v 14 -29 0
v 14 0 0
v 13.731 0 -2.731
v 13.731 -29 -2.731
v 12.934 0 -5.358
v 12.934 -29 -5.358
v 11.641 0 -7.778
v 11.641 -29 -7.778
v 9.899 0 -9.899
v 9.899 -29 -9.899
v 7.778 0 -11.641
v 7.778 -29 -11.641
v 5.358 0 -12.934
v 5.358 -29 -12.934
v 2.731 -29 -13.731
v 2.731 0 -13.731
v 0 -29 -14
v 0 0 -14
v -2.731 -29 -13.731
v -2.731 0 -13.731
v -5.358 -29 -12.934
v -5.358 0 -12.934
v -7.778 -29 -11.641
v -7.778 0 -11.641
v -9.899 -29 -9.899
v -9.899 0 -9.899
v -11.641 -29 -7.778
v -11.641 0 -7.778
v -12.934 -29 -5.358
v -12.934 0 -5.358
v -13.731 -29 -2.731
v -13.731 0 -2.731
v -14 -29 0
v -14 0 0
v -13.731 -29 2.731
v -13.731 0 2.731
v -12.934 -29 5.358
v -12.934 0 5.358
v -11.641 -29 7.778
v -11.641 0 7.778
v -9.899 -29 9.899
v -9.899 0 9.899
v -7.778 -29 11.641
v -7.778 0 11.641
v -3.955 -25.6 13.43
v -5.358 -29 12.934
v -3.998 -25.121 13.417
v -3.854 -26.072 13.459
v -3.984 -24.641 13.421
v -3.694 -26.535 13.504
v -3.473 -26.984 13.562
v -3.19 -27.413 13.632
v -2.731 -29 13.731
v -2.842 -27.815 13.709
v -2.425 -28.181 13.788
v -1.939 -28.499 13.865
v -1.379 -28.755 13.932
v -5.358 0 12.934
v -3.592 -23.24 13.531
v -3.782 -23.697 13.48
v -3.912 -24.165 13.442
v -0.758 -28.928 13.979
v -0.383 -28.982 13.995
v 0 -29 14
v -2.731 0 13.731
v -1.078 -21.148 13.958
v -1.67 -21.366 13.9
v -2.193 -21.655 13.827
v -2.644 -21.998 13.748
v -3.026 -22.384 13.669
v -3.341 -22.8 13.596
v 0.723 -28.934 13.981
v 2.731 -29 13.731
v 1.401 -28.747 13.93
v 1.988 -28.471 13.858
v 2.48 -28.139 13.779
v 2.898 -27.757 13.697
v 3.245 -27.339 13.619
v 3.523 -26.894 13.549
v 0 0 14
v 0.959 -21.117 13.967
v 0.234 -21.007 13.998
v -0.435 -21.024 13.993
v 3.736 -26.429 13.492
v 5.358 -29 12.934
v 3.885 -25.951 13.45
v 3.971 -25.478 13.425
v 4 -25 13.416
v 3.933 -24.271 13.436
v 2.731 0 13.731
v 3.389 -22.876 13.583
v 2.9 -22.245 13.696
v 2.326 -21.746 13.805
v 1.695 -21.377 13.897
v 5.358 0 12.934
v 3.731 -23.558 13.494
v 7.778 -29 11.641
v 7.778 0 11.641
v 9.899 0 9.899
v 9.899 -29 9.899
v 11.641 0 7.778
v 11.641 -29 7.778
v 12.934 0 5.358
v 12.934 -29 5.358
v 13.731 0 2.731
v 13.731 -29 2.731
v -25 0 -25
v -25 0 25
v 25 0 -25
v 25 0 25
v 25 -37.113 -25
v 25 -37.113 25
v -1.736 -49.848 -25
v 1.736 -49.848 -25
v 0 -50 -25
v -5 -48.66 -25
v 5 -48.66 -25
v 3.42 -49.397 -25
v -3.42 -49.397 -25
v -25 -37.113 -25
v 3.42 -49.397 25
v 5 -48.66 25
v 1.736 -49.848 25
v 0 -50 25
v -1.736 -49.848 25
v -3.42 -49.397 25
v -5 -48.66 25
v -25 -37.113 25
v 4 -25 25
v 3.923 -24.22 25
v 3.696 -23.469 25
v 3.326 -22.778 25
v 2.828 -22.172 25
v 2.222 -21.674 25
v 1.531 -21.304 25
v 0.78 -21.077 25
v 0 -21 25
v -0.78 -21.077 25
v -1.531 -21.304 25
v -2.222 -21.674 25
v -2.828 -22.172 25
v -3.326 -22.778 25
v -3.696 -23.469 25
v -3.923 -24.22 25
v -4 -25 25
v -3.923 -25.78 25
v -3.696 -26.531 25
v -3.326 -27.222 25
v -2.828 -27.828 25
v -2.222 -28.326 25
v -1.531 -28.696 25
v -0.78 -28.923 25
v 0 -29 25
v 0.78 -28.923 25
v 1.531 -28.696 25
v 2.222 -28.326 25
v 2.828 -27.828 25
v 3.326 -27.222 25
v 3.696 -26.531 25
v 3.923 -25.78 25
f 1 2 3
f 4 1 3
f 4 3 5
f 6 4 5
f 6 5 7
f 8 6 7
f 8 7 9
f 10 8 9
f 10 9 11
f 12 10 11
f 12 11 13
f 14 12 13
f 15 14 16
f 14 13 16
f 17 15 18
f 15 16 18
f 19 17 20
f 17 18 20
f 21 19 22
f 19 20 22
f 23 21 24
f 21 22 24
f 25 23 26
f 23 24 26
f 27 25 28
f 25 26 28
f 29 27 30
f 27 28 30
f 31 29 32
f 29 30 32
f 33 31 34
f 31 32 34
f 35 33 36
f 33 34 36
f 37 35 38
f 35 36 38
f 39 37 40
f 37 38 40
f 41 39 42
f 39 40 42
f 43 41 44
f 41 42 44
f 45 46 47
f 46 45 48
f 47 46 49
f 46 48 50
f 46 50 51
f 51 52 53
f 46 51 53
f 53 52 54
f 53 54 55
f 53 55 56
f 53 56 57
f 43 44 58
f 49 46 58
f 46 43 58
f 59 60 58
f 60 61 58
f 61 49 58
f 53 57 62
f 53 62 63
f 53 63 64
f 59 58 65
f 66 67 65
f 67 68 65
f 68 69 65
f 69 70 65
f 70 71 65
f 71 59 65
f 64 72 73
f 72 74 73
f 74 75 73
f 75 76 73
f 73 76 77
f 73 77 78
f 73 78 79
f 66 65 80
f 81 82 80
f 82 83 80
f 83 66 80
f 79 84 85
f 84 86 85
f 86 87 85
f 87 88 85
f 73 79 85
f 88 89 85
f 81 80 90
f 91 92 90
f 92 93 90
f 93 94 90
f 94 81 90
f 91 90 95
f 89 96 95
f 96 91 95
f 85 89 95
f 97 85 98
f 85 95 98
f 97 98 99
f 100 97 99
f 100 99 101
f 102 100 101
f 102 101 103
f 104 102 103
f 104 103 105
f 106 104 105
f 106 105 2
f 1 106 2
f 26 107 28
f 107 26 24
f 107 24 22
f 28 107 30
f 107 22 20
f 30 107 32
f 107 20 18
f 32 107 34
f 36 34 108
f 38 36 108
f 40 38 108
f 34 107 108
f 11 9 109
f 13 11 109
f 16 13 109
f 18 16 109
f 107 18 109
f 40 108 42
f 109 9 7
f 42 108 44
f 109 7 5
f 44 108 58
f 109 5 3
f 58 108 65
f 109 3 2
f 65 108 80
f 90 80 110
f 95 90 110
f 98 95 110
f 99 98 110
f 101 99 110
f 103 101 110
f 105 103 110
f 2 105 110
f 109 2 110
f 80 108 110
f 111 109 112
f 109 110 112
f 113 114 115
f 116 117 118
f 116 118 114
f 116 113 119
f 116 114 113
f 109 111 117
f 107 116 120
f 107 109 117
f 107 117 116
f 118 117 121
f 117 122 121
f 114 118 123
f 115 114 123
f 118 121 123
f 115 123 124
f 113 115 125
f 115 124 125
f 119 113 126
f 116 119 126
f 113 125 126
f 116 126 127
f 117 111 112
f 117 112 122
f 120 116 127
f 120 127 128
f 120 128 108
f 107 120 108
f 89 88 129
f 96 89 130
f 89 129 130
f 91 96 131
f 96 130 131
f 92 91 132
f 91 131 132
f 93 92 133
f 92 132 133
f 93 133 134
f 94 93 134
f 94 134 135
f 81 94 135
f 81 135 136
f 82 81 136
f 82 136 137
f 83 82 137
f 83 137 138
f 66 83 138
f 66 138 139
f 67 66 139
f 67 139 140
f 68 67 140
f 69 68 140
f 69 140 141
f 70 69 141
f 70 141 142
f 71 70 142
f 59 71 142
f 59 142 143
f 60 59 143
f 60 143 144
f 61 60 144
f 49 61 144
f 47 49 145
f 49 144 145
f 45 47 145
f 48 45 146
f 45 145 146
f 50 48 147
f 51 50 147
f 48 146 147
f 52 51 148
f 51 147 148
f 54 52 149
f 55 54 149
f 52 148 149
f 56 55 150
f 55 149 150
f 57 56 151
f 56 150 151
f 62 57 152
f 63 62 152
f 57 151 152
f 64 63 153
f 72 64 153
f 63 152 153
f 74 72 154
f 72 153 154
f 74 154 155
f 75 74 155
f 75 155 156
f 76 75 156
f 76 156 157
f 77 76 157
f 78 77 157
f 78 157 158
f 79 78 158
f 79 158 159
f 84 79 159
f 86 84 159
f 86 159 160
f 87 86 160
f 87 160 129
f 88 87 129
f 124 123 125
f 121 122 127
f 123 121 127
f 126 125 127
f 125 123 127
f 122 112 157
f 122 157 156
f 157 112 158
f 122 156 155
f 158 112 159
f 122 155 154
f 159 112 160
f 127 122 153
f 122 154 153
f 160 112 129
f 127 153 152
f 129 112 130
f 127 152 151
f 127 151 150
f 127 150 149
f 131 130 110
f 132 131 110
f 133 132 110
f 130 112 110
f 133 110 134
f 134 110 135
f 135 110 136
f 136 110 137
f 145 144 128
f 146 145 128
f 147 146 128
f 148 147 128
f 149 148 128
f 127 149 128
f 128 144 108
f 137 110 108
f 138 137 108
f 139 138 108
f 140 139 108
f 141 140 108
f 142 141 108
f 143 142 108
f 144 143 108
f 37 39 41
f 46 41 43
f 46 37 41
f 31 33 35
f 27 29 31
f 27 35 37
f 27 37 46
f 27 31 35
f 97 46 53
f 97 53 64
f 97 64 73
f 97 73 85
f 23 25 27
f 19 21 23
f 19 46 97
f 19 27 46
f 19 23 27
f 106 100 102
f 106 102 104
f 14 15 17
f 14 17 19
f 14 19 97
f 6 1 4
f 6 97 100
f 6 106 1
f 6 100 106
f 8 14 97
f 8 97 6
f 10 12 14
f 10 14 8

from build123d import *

# Parameters (mm, degrees)
BOSS_EXTRUDE1_DEPTH = 25
SKETCH2_R           = 14
CUT_EXTRUDE1_DEPTH  = 29
CUT_EXTRUDE2_REACH  = 52
SKETCH3_R           = 4


with BuildPart() as part:
    # Sketch1 → Boss-Extrude1 (new body, symmetric)
    with BuildSketch(Plane.XY):
        with BuildLine():
            Line((-25, 0), (25, 0))
            Line((25, 0), (25, -37.113248654))
            Line((25, -37.113248654), (5, -48.660254038))
            ThreePointArc((5, -48.660254038), (0, -50), (-5, -48.660254038))
            Line((-5, -48.660254038), (-25, -37.113248654))
            Line((-25, -37.113248654), (-25, 0))
        make_face()
    extrude(amount=BOSS_EXTRUDE1_DEPTH, both=True)

    # Sketch2 → Cut-Extrude1 (cut)
    with BuildSketch(Plane(origin=(0, 0, 0), x_dir=(1, 0, 0), z_dir=(0, 1, 0))):
        Circle(SKETCH2_R)
    extrude(amount=-CUT_EXTRUDE1_DEPTH, mode=Mode.SUBTRACT)

    # Sketch3 → Cut-Extrude2 (cut, up to next)
    with BuildSketch(Plane.XY.offset(25), mode=Mode.PRIVATE) as cut_extrude2_sk1:
        with Locations((0, -25)):
            Circle(SKETCH3_R)
    cut_extrude2_tool1 = extrude(cut_extrude2_sk1.sketch, amount=-CUT_EXTRUDE2_REACH, mode=Mode.PRIVATE) & part.part
    add(cut_extrude2_tool1.solids().sort_by_distance((0, -25, 25))[0], mode=Mode.SUBTRACT)


solid = part.part
